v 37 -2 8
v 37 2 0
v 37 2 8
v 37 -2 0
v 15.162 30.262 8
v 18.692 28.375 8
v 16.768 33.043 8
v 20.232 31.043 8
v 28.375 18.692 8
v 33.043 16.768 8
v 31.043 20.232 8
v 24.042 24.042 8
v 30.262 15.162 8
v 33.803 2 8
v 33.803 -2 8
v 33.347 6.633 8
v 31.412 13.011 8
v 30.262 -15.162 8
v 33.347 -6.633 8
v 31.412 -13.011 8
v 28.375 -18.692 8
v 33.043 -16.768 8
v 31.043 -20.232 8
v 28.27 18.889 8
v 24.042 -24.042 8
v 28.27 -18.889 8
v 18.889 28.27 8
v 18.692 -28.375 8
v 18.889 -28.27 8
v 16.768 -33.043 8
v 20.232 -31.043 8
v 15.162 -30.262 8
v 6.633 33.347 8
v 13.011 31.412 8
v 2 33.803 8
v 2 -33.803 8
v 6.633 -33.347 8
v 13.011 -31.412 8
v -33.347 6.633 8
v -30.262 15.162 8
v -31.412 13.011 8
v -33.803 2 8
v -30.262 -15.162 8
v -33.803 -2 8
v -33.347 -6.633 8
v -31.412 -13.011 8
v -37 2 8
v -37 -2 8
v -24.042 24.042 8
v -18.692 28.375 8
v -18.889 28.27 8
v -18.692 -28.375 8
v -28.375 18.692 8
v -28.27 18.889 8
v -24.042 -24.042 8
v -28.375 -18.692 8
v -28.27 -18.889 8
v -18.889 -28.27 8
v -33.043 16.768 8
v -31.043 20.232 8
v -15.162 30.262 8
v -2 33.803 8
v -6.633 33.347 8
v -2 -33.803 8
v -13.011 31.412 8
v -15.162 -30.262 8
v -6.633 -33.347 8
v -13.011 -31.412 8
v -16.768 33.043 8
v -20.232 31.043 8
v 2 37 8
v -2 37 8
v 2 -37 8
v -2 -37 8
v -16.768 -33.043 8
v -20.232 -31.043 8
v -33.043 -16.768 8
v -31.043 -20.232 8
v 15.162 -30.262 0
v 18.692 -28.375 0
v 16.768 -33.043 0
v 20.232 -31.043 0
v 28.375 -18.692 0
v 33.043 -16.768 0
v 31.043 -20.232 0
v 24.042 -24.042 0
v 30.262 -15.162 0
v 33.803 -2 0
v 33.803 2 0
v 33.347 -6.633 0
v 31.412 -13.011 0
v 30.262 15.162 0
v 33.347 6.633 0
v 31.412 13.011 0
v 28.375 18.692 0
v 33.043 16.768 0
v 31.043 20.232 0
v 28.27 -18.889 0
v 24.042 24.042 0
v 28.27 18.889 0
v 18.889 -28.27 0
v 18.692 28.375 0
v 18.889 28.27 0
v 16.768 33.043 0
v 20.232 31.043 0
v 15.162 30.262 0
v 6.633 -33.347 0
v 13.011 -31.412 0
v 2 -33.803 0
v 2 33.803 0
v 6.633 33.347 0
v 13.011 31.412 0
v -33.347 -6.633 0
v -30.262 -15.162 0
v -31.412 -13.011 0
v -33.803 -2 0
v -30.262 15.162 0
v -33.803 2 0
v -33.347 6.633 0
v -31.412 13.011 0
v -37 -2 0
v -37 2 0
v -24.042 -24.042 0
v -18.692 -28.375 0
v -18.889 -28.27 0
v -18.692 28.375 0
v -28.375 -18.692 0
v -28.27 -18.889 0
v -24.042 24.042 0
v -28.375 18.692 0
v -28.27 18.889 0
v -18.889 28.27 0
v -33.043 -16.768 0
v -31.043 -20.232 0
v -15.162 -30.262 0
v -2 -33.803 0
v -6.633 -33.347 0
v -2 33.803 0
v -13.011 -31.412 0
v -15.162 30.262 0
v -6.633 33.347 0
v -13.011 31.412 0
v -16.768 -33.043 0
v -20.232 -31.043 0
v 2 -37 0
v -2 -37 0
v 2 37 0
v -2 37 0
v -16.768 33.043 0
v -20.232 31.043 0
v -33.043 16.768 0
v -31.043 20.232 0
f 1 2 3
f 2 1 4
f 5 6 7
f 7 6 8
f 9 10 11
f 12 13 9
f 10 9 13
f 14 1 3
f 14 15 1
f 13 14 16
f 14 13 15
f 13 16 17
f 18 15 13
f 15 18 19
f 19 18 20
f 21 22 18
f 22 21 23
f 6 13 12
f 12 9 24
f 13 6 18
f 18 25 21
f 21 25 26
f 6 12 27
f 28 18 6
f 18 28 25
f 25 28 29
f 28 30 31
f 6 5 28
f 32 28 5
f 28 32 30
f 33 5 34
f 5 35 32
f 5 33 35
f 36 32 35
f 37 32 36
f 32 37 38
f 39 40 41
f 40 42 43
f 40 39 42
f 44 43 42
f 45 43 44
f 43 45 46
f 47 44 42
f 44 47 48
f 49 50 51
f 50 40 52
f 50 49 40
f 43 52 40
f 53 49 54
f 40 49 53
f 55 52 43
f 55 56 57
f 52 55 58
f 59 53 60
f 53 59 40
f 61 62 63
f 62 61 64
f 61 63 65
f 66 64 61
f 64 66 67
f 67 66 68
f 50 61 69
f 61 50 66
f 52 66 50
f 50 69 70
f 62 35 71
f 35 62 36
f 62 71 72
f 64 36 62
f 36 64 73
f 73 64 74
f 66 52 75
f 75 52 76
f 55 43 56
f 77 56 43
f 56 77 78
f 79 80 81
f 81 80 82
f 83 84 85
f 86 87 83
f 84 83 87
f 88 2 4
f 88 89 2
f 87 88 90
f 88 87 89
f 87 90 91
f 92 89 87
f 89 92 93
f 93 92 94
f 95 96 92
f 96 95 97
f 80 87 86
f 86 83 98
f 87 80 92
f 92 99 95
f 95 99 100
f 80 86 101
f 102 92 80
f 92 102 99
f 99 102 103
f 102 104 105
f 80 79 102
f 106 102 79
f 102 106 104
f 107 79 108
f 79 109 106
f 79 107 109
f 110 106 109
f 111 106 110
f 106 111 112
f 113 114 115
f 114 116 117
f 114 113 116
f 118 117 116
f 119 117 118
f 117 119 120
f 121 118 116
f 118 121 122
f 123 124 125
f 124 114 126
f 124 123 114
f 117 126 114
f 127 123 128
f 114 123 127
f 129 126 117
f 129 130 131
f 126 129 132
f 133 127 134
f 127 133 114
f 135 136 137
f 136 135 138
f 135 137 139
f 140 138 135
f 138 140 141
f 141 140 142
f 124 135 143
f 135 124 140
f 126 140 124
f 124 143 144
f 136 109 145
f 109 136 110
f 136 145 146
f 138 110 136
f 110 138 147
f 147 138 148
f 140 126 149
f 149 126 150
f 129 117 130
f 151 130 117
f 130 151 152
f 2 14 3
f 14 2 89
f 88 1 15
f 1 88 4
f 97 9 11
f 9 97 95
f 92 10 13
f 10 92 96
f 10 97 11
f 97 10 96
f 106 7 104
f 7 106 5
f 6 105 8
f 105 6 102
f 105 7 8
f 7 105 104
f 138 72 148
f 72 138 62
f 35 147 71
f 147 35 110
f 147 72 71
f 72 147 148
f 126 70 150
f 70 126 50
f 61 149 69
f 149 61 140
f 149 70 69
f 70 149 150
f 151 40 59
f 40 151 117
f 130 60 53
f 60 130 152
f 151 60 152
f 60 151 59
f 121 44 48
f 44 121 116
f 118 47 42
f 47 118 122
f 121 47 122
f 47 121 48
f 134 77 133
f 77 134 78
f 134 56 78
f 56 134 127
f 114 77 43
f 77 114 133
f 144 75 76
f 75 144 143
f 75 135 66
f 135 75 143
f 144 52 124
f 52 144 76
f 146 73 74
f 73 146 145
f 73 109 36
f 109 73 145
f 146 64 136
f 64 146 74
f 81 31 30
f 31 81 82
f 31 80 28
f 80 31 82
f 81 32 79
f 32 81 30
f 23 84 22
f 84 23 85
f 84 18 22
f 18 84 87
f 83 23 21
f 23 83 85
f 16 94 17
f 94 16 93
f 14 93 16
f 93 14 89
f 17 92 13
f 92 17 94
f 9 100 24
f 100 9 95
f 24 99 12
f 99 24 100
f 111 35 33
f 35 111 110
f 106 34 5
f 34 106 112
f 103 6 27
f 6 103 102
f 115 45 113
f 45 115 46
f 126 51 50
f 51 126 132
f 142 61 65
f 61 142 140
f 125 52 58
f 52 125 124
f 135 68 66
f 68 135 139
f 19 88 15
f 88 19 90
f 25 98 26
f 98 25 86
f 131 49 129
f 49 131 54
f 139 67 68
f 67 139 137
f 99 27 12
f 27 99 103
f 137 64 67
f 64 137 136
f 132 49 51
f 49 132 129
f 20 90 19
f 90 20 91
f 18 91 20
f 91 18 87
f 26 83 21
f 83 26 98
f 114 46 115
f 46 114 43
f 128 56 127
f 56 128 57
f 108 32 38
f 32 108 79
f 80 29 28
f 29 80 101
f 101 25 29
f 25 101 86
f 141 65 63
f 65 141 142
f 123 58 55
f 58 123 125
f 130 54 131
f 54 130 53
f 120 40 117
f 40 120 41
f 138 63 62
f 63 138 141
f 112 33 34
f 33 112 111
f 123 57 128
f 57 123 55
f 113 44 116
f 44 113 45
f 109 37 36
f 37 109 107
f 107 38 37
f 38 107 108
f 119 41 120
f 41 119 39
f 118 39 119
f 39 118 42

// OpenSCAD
$fn = 32;

// ----------------------------------------------------------------------
// Spur blank: plain gear blank
// ----------------------------------------------------------------------

// --- parameters (mm) ---
disc_r = 34;              // blank root radius
disc_t = 8;               // blank thickness
n_teeth = 12;             // stub tooth count
tooth_w = 4;              // tooth width at the root
tooth_h = 3;              // tooth height above the root

out_r = disc_r + tooth_h;  // tip radius
bbox_x = 74.0;  // measured width over the teeth
bbox_y = 74.0;  // measured depth over the teeth

union() {
  cylinder(r = disc_r, h = disc_t);
  for (i = [0 : n_teeth - 1])
    rotate([0, 0, i * 360 / n_teeth])
      translate([disc_r - 1, -tooth_w / 2, 0])
        cube([tooth_h + 1, tooth_w, disc_t]);
}
